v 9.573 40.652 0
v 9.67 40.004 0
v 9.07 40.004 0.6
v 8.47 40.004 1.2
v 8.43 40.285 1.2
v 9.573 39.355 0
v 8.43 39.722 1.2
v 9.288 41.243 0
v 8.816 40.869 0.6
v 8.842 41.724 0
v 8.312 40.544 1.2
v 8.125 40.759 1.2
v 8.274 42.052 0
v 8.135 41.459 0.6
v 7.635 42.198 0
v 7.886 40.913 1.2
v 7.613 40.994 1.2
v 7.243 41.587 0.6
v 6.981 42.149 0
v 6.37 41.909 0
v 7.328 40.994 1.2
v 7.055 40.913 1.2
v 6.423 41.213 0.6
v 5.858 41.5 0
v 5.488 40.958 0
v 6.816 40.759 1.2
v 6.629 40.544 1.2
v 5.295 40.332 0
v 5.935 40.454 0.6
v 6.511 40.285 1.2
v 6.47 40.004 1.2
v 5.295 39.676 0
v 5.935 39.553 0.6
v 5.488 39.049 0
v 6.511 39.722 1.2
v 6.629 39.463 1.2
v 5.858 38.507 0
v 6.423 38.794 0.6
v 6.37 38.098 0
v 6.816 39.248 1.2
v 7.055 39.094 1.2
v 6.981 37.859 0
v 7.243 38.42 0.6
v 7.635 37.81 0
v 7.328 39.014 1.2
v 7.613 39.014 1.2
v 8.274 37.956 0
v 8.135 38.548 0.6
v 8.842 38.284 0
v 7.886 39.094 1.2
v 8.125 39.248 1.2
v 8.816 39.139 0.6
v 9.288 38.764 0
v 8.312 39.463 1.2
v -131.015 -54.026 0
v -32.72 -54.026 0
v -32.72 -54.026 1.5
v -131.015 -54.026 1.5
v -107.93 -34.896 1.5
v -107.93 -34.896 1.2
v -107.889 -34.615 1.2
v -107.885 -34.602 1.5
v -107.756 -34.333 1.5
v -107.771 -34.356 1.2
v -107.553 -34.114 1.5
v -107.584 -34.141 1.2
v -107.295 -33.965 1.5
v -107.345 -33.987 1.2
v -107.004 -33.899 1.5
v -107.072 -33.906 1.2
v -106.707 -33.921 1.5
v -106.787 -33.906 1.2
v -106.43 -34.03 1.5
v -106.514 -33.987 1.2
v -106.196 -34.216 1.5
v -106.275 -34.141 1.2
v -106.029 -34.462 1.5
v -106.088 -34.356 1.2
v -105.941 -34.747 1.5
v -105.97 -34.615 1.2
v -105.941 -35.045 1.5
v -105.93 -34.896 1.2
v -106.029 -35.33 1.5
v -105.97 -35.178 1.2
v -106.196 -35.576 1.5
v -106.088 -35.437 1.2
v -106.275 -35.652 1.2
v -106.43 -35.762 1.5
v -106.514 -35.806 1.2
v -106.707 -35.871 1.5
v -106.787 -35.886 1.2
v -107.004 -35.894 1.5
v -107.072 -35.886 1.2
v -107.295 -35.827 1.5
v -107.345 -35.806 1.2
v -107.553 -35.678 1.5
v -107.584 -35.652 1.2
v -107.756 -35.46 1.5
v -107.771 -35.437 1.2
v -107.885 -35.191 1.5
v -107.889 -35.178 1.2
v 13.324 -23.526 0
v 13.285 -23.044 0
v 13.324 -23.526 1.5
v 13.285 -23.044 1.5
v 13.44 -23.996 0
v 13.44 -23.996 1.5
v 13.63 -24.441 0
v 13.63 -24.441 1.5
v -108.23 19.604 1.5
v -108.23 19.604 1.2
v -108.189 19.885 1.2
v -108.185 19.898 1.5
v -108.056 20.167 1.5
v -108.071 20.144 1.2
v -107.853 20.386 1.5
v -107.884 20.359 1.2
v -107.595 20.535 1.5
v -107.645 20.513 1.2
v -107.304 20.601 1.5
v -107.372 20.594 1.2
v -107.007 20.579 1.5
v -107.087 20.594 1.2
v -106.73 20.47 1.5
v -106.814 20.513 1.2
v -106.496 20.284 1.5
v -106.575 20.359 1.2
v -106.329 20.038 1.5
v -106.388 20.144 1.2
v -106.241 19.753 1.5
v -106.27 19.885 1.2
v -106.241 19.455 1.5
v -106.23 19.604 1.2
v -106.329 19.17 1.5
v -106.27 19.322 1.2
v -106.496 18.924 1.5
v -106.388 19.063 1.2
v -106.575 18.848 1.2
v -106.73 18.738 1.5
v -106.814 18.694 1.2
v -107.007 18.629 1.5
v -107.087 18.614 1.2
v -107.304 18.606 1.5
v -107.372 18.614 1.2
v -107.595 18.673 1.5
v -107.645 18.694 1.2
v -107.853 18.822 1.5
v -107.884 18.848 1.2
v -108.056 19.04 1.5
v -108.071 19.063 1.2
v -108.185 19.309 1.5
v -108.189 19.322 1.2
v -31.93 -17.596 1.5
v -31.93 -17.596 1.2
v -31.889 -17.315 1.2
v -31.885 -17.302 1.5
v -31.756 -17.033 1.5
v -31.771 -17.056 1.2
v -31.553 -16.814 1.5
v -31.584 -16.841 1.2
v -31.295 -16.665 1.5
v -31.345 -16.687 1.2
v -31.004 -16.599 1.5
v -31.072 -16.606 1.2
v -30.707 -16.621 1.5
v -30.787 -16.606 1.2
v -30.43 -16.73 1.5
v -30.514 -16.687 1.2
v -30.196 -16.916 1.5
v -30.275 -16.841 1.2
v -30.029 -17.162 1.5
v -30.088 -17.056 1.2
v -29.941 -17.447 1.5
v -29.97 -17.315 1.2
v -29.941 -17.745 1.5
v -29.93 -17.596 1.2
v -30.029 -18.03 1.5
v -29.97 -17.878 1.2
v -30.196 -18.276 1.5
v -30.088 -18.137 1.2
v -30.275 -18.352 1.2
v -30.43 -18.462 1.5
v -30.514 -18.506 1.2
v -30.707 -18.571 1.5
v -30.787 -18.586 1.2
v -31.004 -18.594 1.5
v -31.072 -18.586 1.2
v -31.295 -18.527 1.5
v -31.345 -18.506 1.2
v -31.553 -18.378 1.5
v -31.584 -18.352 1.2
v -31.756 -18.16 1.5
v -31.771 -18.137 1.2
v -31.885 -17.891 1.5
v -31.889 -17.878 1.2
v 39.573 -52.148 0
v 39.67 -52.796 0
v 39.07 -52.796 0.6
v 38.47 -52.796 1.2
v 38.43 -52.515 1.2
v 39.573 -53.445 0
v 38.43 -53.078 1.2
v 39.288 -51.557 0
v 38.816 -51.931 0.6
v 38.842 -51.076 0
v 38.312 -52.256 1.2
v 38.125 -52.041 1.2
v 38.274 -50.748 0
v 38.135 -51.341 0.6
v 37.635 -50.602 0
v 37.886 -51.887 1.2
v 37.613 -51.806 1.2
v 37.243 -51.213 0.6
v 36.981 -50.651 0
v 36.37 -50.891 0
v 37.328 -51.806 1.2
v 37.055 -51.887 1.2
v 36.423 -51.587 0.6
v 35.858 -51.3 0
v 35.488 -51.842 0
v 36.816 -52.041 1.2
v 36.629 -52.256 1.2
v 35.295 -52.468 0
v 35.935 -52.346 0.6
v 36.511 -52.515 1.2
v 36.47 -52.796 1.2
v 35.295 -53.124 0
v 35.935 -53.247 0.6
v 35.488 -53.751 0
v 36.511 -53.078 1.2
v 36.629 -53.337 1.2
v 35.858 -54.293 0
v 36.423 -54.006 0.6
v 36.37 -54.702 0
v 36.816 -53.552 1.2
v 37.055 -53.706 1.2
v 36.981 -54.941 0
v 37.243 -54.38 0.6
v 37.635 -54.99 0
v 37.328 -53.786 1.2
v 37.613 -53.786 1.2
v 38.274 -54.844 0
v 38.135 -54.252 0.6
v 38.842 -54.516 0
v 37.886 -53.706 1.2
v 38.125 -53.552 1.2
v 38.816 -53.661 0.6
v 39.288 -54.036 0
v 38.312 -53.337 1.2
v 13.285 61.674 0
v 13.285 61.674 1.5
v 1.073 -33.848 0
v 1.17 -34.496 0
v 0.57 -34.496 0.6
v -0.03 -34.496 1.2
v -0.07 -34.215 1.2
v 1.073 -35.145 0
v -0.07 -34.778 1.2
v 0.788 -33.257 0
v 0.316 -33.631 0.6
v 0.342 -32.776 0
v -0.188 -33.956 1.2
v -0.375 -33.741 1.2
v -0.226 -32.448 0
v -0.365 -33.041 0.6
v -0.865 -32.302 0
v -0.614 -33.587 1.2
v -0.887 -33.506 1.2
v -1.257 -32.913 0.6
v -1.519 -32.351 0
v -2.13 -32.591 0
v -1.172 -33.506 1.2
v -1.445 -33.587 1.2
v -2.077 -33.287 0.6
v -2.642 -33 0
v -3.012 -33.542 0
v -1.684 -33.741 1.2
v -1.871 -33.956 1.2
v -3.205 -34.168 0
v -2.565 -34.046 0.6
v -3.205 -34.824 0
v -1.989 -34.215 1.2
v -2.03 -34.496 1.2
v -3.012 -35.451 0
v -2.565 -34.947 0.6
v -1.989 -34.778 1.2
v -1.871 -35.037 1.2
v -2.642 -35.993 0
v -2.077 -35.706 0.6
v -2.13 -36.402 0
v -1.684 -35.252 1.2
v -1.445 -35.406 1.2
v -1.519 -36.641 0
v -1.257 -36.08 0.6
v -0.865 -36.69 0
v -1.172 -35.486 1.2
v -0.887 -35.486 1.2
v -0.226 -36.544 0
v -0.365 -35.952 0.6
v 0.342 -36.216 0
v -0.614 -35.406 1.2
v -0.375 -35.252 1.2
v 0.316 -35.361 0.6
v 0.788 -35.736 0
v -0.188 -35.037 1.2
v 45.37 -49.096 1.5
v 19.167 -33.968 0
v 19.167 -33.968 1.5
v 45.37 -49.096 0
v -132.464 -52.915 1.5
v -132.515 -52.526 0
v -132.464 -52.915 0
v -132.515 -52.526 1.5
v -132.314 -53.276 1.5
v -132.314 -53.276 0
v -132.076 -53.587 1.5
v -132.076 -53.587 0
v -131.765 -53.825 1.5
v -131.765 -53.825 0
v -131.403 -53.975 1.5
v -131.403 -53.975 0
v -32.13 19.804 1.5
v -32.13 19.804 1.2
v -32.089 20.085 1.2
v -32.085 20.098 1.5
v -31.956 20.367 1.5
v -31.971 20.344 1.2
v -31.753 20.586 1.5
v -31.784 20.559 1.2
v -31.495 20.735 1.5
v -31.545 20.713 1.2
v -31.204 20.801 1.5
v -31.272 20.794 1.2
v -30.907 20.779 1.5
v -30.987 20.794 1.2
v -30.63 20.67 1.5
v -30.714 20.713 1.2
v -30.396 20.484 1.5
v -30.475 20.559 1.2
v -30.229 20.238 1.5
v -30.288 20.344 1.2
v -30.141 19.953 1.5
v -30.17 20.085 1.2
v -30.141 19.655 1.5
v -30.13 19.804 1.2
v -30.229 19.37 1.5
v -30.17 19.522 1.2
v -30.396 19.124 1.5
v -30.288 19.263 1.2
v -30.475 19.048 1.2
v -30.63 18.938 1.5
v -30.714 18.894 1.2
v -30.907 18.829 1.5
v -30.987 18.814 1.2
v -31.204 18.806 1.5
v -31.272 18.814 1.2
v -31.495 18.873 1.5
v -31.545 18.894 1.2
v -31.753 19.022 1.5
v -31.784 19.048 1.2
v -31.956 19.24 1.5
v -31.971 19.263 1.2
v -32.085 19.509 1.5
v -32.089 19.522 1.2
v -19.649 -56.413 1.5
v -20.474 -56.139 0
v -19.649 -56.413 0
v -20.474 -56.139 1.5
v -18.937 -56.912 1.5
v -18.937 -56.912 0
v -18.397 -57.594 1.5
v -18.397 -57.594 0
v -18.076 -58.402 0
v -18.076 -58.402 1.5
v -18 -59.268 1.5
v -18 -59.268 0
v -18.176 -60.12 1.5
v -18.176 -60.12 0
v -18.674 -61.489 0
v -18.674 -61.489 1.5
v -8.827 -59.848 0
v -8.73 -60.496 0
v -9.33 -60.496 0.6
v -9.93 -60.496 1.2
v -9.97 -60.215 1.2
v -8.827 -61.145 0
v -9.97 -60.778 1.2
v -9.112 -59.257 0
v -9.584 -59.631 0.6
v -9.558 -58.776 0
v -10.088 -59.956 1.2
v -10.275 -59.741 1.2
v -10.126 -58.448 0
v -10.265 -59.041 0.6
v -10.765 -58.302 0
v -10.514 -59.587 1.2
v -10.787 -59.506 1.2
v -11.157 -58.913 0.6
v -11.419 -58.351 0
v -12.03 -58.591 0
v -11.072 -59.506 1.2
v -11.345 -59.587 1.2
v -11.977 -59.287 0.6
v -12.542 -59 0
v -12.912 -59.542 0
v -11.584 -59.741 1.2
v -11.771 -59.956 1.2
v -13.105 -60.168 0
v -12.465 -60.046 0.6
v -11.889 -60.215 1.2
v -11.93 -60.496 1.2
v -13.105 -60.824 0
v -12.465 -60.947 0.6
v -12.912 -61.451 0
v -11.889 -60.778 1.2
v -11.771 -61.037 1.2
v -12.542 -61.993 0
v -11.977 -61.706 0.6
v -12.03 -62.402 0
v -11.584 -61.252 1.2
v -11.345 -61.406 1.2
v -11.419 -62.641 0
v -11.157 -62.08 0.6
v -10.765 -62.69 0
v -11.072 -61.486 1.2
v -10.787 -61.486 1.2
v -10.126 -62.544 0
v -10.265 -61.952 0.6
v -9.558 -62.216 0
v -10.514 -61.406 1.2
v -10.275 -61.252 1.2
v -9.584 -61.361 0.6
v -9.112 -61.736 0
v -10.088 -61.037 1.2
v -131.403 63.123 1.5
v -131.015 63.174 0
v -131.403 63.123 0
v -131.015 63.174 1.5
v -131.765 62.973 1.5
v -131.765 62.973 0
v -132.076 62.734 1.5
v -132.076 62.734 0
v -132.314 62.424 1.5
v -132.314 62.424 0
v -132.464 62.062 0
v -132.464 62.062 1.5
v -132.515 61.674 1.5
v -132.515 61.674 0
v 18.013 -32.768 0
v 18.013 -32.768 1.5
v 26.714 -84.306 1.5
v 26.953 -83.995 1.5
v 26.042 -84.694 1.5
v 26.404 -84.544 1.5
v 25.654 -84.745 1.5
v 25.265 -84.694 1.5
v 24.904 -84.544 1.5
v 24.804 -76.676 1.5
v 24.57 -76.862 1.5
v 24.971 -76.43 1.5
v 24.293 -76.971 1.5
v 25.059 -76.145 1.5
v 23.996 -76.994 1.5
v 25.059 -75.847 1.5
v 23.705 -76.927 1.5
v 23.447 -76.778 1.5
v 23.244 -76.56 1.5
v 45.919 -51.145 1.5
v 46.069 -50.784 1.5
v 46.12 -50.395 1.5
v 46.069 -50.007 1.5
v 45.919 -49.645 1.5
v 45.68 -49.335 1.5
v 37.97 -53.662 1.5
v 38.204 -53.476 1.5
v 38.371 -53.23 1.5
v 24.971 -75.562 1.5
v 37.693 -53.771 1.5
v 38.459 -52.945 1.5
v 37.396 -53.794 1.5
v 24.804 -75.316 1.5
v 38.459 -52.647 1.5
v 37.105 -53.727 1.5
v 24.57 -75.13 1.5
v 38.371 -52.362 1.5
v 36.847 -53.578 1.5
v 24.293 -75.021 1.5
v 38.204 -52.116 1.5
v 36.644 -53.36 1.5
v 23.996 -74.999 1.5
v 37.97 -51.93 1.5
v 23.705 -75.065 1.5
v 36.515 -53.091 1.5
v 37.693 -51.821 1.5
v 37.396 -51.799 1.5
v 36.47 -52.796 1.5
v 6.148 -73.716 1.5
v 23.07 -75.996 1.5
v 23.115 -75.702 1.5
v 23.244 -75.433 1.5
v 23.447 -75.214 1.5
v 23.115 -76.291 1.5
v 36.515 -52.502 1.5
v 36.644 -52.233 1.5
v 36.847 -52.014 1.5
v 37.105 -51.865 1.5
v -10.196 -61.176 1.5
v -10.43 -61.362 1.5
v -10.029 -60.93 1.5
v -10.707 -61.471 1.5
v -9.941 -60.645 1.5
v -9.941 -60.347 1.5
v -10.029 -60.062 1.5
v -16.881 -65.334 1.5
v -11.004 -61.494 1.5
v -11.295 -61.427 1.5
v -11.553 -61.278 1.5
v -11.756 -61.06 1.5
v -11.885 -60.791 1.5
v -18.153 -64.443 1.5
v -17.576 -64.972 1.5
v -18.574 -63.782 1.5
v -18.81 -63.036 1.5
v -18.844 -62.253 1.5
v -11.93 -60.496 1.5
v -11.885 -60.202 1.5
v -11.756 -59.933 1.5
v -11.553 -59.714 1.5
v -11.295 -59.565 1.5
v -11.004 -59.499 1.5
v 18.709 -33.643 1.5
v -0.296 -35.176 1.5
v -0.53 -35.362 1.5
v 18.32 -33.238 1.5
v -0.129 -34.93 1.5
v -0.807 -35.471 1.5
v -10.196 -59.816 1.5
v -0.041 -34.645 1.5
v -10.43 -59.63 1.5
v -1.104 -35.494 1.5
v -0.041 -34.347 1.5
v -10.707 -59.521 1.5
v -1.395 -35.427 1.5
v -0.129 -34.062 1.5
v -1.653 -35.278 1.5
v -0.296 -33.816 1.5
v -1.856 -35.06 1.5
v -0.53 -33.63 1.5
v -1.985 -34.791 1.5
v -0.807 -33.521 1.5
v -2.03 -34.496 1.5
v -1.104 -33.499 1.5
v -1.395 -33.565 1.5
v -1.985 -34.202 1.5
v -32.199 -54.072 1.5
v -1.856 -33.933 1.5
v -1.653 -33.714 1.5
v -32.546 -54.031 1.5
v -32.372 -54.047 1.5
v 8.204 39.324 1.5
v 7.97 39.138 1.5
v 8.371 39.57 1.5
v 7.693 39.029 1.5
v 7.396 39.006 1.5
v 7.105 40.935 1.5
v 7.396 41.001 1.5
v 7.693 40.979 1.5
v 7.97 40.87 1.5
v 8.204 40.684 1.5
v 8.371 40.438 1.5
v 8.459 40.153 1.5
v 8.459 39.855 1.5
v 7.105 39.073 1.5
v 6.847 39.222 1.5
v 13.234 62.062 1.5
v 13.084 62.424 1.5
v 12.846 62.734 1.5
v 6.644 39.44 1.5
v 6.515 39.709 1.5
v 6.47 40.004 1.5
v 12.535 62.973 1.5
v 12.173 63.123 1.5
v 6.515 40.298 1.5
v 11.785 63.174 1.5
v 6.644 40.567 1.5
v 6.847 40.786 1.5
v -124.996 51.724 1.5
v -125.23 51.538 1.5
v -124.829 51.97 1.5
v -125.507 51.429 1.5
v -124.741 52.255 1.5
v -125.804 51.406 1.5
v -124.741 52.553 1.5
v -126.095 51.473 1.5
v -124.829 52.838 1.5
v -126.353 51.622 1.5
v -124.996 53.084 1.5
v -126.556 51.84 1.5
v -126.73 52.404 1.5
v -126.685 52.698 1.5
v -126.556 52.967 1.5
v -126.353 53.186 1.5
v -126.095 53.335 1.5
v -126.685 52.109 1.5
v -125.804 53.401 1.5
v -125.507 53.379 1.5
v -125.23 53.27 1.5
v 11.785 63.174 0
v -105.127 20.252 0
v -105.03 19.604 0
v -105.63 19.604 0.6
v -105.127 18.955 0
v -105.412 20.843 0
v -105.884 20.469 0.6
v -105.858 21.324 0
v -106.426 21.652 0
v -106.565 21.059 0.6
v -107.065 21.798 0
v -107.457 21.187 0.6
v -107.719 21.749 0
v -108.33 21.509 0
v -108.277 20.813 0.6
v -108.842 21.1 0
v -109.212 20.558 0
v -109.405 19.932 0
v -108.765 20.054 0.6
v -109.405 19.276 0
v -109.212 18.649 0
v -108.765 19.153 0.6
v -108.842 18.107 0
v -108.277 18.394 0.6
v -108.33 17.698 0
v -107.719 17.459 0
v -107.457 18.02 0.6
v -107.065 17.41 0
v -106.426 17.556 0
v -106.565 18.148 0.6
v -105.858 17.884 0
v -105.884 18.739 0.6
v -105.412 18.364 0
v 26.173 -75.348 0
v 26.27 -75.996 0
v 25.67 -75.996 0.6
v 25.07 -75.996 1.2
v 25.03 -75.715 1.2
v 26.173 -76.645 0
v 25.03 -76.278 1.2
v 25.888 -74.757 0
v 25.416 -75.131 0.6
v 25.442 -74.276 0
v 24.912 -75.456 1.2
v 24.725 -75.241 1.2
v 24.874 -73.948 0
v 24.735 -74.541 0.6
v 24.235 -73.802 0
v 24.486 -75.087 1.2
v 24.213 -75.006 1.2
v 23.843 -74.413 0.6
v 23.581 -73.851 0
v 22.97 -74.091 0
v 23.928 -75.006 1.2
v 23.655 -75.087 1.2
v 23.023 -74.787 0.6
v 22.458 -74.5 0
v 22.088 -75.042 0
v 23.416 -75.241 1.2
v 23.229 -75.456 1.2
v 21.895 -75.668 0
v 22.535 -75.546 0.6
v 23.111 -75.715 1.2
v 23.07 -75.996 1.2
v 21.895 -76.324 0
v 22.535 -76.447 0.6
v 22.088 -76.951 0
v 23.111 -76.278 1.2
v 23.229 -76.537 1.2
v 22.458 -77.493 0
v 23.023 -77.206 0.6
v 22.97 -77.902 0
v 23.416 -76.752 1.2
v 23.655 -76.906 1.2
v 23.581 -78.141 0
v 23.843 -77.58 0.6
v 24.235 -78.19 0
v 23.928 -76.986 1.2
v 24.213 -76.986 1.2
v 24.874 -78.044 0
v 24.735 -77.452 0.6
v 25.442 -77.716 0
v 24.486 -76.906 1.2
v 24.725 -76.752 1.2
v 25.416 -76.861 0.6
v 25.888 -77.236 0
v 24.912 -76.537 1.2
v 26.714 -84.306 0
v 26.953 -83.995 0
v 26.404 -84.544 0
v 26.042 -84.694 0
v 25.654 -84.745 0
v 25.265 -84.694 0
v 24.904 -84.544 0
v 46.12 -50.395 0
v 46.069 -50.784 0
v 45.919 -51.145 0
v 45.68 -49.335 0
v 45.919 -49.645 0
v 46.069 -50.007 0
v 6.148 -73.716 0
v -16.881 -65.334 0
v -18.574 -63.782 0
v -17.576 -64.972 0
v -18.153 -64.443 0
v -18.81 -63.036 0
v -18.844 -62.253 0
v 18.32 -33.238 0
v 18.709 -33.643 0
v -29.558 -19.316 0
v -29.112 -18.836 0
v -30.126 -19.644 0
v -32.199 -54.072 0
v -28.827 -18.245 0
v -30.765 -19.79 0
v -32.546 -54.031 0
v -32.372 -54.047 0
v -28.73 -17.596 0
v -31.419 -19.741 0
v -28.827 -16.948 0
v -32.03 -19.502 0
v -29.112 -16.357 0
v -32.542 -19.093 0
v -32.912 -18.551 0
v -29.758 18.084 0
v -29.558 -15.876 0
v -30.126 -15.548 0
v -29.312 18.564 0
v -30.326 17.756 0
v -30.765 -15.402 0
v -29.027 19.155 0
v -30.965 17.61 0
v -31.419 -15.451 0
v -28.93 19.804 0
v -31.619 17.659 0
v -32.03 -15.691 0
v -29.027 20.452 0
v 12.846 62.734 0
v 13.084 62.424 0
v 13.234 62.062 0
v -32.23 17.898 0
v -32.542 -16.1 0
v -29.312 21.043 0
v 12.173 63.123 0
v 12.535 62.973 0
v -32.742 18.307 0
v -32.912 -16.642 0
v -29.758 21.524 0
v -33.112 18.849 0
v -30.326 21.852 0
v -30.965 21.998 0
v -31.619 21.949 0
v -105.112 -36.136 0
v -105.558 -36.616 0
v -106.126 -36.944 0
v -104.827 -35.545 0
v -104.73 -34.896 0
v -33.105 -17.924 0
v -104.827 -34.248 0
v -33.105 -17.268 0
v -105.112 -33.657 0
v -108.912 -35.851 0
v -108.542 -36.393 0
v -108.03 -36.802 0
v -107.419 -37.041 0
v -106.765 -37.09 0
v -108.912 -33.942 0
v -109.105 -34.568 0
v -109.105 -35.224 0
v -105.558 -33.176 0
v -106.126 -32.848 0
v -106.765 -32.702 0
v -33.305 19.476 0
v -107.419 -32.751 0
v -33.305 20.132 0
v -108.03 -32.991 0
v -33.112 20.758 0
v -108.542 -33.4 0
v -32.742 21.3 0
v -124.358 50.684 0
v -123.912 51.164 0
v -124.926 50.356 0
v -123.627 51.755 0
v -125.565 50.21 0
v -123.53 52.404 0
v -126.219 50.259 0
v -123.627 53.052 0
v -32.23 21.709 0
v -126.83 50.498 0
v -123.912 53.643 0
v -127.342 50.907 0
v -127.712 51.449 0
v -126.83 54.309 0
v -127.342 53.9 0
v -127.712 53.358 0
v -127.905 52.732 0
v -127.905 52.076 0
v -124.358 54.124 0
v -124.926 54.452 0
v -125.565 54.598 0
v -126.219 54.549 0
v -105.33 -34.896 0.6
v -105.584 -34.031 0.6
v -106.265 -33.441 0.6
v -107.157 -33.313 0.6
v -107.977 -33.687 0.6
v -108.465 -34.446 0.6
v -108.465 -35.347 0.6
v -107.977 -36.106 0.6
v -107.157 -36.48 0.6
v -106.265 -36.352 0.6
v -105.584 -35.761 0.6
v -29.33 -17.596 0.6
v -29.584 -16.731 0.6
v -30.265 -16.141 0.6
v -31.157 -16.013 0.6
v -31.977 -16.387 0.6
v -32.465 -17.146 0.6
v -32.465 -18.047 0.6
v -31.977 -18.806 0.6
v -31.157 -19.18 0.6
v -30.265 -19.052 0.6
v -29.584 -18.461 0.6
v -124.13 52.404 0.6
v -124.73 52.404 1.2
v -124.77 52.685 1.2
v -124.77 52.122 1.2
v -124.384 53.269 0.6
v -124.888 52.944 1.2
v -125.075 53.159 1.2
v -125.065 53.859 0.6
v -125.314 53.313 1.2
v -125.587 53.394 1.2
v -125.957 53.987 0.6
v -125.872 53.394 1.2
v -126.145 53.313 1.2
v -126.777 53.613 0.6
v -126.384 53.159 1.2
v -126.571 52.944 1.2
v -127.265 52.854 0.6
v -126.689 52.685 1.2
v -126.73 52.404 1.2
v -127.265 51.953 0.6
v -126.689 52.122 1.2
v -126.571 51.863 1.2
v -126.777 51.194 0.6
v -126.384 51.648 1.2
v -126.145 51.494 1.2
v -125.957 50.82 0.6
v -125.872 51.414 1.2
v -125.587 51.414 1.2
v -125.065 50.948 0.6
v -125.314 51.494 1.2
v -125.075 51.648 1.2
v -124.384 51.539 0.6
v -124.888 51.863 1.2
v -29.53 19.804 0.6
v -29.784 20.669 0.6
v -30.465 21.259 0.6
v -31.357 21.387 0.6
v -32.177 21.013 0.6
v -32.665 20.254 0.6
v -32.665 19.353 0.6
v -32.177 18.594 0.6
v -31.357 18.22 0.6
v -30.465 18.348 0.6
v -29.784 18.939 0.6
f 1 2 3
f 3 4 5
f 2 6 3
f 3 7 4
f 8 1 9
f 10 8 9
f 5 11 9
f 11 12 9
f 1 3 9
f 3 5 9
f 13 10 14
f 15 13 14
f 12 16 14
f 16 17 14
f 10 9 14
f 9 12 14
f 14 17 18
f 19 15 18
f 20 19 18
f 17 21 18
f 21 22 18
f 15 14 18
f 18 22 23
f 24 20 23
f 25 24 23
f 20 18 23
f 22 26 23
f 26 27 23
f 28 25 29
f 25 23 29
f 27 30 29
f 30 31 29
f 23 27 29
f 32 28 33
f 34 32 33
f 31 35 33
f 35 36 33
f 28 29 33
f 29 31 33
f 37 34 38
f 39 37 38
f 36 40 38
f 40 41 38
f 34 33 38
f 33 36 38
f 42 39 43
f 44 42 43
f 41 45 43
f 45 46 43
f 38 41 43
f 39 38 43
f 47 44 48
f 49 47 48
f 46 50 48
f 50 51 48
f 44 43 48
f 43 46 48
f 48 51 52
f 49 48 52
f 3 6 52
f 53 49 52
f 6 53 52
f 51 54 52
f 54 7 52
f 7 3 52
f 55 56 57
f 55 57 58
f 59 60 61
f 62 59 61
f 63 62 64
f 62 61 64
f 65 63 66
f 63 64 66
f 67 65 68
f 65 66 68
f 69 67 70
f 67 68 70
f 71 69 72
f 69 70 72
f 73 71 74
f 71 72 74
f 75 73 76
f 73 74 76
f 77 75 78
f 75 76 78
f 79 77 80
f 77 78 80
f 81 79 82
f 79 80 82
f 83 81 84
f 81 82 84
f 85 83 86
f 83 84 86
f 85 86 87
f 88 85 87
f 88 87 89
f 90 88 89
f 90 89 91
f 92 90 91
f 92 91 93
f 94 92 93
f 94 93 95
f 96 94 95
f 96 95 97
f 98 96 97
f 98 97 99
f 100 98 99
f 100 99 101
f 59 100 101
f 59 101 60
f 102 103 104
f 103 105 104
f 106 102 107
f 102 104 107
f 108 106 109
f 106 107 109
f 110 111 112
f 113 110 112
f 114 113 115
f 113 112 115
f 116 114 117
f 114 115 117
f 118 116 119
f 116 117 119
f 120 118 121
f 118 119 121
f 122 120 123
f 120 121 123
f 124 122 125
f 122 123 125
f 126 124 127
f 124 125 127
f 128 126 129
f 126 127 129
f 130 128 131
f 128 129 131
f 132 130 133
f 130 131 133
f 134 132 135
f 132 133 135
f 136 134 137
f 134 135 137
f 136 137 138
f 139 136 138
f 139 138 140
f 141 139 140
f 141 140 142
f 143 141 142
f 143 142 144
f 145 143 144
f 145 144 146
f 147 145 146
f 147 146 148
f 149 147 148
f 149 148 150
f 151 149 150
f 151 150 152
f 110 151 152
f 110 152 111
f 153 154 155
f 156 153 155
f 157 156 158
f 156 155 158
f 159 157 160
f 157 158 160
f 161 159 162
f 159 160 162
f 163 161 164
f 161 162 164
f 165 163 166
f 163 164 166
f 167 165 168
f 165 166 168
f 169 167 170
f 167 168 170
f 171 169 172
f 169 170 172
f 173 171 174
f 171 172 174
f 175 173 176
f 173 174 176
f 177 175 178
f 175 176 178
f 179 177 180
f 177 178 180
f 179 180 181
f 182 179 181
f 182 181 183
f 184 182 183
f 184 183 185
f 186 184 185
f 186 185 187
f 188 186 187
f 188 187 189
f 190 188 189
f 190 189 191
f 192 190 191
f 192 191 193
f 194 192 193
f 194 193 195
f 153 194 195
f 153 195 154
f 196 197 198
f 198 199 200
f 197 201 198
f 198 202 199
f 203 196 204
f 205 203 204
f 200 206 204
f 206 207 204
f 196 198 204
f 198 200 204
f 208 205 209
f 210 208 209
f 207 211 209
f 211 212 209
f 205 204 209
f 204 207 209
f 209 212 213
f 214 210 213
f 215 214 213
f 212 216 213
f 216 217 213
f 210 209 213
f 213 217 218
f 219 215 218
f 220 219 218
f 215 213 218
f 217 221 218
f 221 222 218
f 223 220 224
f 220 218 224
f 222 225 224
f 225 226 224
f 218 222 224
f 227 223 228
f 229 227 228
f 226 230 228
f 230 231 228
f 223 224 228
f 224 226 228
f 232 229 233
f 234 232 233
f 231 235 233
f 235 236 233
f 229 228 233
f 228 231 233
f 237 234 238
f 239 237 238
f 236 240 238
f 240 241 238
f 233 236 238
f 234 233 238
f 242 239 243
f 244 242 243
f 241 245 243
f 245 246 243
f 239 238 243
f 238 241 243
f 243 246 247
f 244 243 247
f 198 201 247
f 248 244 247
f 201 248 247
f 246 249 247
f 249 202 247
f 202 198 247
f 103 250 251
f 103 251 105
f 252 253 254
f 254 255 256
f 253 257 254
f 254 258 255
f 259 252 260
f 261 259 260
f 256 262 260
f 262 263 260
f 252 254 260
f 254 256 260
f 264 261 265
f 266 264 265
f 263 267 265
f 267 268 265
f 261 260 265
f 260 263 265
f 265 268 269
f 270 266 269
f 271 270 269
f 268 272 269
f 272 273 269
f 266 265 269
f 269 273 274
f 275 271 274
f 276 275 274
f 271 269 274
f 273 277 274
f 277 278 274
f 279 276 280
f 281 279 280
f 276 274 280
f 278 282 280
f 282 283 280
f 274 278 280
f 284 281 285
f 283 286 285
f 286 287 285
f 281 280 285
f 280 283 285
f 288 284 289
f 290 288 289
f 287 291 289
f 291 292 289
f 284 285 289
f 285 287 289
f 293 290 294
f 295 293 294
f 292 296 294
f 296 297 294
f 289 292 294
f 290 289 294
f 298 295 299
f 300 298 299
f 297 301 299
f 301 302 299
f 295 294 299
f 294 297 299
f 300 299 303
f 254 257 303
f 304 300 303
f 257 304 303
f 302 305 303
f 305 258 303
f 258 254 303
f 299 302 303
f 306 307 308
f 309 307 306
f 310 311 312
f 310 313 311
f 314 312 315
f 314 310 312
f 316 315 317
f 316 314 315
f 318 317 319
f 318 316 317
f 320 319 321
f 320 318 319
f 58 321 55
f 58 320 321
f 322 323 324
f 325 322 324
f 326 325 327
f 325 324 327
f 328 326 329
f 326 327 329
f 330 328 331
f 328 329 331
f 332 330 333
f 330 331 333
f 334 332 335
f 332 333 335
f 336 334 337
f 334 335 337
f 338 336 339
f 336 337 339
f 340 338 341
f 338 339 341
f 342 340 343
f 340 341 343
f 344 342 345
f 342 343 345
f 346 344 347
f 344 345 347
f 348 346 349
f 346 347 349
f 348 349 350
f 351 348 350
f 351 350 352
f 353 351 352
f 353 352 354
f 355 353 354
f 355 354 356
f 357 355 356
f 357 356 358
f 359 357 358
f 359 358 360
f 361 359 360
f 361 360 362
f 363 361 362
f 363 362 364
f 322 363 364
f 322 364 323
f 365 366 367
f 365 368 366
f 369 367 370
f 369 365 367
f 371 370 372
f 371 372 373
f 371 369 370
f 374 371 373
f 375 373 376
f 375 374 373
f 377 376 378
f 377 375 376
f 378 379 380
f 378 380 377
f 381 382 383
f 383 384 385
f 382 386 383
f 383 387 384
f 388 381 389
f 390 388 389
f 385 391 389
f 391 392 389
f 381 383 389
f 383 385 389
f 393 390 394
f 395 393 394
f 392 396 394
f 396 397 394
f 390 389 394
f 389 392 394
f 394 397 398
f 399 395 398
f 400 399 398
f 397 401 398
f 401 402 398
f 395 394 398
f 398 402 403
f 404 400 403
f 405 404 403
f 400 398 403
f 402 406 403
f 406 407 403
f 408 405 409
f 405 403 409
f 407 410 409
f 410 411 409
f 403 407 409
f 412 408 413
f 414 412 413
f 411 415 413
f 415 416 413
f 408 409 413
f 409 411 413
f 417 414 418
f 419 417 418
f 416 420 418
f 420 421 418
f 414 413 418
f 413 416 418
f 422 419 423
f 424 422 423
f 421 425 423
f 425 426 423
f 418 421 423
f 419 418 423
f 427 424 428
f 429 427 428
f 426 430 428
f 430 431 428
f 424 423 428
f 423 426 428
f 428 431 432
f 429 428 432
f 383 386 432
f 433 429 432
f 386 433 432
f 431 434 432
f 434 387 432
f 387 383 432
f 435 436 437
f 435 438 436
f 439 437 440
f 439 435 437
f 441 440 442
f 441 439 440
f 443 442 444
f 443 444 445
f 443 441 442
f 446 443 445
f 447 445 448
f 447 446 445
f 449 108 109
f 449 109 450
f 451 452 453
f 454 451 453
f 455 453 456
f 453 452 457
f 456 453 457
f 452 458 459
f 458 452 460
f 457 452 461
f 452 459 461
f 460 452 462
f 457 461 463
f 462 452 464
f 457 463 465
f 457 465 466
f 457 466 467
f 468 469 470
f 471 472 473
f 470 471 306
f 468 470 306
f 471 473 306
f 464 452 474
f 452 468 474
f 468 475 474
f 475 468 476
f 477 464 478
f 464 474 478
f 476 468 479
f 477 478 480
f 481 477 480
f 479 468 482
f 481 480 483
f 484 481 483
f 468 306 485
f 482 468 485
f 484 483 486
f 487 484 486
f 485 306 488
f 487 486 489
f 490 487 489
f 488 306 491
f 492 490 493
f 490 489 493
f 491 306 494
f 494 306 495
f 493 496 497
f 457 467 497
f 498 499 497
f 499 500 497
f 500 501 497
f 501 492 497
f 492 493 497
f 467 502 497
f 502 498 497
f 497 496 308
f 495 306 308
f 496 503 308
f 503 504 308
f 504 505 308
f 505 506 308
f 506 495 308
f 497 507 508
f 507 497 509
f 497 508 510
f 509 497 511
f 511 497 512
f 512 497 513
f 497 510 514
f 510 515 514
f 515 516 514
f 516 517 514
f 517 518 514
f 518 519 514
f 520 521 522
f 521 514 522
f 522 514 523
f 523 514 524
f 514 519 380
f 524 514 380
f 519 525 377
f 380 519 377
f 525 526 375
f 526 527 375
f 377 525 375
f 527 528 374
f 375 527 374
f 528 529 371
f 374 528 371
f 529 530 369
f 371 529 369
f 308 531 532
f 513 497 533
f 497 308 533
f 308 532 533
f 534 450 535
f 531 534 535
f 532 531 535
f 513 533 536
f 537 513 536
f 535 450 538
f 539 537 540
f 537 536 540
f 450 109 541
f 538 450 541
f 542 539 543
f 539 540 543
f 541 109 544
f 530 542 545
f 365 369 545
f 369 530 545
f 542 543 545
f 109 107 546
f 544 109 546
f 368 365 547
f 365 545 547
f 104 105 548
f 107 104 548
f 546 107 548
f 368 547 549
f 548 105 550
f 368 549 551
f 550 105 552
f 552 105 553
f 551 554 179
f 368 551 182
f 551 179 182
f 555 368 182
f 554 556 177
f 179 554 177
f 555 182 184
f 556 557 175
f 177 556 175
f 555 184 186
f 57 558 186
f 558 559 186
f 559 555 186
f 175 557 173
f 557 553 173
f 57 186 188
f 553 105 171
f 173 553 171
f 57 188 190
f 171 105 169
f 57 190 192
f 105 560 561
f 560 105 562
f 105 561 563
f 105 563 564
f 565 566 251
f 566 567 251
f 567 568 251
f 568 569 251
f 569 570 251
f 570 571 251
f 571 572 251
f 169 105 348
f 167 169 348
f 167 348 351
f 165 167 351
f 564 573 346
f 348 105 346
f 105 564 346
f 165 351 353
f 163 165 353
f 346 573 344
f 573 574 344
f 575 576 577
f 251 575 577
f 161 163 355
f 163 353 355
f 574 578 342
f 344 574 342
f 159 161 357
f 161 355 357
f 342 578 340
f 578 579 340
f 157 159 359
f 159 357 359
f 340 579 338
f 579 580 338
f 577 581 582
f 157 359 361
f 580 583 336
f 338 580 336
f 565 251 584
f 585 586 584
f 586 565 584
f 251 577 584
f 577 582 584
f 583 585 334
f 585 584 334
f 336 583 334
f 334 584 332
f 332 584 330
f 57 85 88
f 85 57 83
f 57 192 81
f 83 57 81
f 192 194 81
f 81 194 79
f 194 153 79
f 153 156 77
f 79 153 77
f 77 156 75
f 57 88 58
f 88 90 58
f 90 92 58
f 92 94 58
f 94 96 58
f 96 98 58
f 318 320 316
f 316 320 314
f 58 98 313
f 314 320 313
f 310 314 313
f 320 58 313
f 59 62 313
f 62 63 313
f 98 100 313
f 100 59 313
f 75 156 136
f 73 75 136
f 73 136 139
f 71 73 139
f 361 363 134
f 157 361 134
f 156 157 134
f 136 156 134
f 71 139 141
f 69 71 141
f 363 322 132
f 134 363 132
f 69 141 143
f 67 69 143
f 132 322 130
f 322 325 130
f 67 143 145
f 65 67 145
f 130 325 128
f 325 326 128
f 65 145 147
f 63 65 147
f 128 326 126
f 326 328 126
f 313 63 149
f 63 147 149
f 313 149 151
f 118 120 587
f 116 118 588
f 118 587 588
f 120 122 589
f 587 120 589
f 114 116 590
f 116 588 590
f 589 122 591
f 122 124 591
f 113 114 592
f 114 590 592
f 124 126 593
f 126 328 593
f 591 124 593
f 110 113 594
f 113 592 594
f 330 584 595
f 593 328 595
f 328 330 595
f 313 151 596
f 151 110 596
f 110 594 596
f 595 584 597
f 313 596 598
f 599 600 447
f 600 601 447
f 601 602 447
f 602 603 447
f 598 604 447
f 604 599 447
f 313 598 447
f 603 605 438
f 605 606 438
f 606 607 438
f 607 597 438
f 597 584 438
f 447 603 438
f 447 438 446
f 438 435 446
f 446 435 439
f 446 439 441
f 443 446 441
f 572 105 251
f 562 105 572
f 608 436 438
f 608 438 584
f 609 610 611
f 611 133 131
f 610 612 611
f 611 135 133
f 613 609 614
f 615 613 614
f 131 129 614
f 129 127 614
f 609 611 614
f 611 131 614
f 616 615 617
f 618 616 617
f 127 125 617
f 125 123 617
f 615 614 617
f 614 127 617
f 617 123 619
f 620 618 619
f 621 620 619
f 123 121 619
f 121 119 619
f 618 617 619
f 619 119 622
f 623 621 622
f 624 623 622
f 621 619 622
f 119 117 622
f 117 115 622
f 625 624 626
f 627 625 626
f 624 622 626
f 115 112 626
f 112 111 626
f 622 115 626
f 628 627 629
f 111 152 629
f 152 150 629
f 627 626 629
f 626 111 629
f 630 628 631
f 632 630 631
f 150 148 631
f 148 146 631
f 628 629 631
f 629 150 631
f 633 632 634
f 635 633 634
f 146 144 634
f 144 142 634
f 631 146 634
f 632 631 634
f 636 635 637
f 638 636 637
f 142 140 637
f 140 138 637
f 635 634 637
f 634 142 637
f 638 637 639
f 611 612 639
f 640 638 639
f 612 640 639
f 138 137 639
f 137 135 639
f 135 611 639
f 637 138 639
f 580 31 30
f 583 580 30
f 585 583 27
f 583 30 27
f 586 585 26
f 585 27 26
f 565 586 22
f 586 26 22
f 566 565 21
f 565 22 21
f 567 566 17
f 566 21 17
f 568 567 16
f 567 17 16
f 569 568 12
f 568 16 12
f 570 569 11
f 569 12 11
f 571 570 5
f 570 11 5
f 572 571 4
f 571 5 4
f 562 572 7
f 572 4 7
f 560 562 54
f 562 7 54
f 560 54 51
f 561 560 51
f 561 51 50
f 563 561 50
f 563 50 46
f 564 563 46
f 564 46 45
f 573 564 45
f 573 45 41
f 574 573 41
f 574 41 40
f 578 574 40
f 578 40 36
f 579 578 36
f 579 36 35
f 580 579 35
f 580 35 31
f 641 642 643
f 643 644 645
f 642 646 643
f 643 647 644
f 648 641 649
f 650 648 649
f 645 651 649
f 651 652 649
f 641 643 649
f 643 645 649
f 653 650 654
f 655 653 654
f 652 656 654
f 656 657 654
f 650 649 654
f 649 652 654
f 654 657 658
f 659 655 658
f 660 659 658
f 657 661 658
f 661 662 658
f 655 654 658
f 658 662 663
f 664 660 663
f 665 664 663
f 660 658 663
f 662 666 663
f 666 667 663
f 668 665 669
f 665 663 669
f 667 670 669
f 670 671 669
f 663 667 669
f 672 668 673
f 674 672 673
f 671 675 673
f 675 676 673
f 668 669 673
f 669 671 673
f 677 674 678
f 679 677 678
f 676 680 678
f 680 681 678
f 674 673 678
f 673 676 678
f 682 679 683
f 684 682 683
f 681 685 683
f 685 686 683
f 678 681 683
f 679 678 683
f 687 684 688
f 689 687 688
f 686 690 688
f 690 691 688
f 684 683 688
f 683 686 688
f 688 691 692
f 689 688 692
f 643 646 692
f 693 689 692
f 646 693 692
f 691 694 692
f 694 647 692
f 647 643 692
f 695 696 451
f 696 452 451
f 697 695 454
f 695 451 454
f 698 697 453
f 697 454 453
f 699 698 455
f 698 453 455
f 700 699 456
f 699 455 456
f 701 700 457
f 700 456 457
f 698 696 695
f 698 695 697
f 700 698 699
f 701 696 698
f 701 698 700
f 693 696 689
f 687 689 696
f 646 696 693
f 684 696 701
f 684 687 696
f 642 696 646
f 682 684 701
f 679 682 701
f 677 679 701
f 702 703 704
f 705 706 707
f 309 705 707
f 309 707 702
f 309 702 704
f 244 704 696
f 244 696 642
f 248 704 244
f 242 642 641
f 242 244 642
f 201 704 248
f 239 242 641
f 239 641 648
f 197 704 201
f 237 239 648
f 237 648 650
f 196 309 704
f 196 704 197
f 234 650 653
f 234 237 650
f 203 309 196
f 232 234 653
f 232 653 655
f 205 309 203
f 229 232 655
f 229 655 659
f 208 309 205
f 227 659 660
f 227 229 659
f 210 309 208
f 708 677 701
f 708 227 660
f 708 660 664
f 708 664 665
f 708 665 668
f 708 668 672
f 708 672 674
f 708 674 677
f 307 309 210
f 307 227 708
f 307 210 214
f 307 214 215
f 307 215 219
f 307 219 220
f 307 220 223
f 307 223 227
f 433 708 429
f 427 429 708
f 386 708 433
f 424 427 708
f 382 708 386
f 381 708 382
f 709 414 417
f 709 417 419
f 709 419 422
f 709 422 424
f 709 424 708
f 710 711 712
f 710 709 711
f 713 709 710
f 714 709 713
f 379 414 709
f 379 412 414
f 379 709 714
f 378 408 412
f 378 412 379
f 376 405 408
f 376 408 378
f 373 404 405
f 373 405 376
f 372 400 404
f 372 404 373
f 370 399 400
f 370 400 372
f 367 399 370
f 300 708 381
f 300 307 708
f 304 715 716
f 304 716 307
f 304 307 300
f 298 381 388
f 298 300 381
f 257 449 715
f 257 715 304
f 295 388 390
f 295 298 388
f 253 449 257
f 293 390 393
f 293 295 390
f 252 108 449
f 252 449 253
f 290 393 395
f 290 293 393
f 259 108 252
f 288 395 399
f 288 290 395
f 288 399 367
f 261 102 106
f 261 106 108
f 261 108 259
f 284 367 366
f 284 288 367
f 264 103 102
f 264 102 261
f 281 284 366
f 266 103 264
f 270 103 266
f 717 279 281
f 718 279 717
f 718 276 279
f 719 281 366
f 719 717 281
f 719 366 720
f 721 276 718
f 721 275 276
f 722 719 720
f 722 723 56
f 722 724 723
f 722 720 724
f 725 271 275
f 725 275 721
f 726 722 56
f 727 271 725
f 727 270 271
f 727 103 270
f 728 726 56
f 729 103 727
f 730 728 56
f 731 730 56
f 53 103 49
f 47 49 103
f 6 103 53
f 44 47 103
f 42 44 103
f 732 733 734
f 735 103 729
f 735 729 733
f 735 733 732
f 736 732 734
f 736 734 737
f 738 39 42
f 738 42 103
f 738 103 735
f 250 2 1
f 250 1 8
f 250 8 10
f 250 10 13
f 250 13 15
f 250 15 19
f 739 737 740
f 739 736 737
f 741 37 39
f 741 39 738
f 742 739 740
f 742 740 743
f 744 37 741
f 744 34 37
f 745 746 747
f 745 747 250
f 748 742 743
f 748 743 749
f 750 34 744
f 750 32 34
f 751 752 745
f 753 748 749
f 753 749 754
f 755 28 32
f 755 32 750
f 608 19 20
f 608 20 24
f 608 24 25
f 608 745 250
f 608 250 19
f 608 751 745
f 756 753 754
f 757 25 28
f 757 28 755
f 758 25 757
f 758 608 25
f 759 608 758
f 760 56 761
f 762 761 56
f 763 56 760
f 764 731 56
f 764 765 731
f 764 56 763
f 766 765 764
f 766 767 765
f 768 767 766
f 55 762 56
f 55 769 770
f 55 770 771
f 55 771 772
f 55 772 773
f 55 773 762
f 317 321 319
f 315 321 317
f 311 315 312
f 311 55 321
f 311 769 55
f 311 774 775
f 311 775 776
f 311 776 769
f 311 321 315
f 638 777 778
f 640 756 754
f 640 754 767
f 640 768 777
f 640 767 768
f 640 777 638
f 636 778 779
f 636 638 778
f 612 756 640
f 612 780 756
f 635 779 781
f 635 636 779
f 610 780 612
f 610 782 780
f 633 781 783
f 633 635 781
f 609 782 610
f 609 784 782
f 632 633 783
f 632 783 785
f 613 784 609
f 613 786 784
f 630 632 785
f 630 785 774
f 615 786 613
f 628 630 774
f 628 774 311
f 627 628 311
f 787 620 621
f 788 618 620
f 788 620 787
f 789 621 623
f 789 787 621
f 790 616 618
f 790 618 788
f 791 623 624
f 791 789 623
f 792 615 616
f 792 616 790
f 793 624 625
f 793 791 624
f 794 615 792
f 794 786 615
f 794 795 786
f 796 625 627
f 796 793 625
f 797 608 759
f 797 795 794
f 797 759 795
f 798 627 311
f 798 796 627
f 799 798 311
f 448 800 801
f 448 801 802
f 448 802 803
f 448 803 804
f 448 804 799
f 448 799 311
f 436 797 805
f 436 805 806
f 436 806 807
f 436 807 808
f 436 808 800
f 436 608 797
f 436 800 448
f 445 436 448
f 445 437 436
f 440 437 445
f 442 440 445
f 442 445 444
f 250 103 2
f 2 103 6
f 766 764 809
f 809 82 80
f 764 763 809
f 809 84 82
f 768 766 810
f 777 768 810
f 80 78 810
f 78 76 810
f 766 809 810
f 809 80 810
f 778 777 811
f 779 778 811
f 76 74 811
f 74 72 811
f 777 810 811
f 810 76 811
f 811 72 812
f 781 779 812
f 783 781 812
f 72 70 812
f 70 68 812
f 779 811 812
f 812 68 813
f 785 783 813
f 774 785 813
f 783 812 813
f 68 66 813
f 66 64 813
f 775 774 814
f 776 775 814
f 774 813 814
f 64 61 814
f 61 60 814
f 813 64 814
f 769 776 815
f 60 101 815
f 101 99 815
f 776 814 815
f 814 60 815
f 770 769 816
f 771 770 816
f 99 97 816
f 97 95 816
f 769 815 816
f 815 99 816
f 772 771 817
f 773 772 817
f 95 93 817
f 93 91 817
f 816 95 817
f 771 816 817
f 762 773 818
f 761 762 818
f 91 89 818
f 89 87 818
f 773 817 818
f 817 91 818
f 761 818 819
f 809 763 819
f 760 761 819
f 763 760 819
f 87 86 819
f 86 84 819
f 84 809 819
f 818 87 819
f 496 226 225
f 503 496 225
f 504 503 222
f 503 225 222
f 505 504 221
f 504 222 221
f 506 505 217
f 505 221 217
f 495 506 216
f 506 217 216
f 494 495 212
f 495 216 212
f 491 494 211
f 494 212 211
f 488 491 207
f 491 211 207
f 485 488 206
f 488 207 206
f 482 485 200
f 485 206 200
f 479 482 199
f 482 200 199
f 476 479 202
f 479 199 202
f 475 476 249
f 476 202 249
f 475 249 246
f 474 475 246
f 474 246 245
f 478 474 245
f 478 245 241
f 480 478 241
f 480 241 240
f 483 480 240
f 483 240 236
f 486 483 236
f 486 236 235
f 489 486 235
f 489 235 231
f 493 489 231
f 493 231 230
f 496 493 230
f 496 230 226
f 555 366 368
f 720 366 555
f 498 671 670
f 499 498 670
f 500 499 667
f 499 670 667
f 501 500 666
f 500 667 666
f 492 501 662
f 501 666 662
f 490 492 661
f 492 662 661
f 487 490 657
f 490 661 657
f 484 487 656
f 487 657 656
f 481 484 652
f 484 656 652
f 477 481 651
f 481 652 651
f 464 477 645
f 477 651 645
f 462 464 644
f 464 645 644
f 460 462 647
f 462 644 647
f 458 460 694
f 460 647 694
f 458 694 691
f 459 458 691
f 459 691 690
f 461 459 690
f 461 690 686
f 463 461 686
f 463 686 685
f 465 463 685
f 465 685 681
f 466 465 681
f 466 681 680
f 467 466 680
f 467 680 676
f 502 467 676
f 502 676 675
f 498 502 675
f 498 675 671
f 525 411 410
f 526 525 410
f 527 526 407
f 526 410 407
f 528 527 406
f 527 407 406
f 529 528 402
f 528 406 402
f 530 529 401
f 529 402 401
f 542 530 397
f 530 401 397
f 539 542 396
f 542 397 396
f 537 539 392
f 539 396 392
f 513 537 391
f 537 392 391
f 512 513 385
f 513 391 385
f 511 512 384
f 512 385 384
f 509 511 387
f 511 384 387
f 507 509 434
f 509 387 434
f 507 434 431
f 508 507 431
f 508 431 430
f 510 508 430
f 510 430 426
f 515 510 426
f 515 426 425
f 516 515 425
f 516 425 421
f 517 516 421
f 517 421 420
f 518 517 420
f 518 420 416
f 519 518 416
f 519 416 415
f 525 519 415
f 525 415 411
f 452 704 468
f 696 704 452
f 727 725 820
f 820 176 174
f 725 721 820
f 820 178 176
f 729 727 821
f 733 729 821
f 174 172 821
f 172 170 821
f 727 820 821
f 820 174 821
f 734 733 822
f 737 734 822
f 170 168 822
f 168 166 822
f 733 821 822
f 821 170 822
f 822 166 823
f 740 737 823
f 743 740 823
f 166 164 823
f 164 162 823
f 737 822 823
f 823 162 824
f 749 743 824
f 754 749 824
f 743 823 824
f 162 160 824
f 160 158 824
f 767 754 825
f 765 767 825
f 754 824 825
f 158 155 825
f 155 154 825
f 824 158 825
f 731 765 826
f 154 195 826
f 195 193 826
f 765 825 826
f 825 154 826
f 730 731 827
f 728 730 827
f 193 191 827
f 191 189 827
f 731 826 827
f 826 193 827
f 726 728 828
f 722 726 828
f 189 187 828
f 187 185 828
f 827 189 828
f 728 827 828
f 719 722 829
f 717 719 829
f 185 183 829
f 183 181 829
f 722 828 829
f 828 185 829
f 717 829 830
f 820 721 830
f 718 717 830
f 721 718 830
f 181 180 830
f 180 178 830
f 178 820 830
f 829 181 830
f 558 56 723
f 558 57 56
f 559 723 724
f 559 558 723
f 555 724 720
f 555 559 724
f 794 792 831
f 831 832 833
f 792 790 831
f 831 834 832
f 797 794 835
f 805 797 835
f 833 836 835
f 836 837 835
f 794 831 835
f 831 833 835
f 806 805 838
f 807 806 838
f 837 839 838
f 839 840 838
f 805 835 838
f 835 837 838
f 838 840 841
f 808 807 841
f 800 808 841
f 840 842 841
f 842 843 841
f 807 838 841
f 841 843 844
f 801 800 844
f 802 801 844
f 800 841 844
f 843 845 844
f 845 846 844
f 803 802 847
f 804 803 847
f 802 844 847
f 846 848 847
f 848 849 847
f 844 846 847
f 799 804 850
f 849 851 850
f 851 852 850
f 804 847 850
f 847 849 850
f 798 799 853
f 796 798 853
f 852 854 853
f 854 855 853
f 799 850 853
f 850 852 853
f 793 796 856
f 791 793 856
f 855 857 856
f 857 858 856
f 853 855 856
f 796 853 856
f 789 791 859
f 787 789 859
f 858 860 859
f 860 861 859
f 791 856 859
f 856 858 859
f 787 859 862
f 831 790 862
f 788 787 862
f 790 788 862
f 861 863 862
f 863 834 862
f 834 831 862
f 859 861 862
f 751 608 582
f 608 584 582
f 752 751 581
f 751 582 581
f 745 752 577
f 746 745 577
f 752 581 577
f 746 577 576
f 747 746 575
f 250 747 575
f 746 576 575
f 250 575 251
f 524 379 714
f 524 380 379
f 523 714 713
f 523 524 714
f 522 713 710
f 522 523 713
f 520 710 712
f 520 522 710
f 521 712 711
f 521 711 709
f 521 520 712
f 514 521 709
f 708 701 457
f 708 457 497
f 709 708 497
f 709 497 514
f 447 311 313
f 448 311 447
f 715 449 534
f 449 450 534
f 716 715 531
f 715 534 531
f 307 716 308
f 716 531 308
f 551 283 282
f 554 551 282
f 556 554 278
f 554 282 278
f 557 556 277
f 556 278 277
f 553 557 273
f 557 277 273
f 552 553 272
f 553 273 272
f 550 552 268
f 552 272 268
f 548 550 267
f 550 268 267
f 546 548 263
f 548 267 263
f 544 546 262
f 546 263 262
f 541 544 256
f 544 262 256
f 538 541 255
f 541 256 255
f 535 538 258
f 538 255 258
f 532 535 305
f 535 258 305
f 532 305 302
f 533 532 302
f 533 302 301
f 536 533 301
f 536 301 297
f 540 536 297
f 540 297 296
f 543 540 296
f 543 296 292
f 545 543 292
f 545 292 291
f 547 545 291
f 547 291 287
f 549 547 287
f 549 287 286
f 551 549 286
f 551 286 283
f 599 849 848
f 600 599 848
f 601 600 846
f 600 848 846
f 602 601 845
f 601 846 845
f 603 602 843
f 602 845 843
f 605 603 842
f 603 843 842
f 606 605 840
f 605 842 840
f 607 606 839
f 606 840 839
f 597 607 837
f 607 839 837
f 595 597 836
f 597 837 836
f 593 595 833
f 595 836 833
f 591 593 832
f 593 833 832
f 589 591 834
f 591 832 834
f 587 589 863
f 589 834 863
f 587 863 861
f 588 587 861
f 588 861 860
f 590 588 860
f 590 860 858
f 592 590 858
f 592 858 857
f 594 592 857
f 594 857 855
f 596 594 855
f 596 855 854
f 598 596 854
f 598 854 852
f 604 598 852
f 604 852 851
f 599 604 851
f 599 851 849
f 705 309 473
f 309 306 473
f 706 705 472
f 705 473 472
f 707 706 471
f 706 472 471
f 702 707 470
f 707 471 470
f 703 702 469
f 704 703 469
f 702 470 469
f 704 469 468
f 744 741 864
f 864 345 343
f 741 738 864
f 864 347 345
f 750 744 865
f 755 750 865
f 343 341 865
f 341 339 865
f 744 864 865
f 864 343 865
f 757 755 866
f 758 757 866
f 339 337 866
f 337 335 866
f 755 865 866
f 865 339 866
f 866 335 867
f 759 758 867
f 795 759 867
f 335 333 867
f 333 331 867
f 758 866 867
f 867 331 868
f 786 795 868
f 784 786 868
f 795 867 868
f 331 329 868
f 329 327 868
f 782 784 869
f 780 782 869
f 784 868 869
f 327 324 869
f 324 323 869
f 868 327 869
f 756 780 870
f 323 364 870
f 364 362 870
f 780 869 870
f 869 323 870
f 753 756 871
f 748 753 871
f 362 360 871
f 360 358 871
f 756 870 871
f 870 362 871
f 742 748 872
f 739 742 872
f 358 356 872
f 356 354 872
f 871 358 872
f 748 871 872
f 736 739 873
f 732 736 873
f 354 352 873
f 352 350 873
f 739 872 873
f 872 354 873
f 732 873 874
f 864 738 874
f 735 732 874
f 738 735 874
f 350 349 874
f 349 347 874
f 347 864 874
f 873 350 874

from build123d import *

# Parameters (mm, degrees)
BOSS_EXTRUDE1_DEPTH = 1.5
SKETCH6_R           = 1
CUT_EXTRUDE1_DEPTH  = 10
FILLET4_R           = 1.5
FILLET5_R           = 3


# Read off the part's stored shape, not the designer's step: AdvancedHole1
with BuildPart() as part:
    # Sketch1 → Boss-Extrude1 (new body)
    with BuildSketch(Plane.XY):
        Polygon((-132.514999879, 63.173696093), (13.284995002, 63.173696093), (13.284995002, -23.784888353), (18.416457767, -33.534813854), (46.668669763, -49.846236055), (26.202746282, -85.294255348), (6.148371034, -73.7158564), (-19.700470814, -64.307647377), (-16.953396025, -56.760121426), (-32.457645619, -54.026303907), (-132.514999879, -54.026303907), align=None)
    extrude(amount=BOSS_EXTRUDE1_DEPTH)

    # Sketch6 → Cut-Extrude1 (cut)
    with BuildSketch(Plane(origin=(0, 0, 0), x_dir=(-1, 0, 0), z_dir=(0, 0, -1))):
        with Locations((125.729523879, 52.403696093)):
            Circle(SKETCH6_R)
        with Locations((106.929523879, -34.896303907)):
            Circle(SKETCH6_R)
        with Locations((30.929523879, -17.596303907)):
            Circle(SKETCH6_R)
        with Locations((31.129523879, 19.803696093)):
            Circle(SKETCH6_R)
        with Locations((-7.470476121, 40.003696093)):
            Circle(SKETCH6_R)
        with Locations((1.029523879, -34.496303907)):
            Circle(SKETCH6_R)
        with Locations((10.929523879, -60.496303907)):
            Circle(SKETCH6_R)
        with Locations((-37.470476121, -52.796303907)):
            Circle(SKETCH6_R)
        with Locations((-24.070476121, -75.996303907)):
            Circle(SKETCH6_R)
        with Locations((107.229523879, 19.603696093)):
            Circle(SKETCH6_R)
    extrude(amount=-CUT_EXTRUDE1_DEPTH, mode=Mode.SUBTRACT)

    # AdvancedHole1 outline → AdvancedHole1 (revolve, cut)
    with BuildSketch(Plane(origin=(37.470476121, -52.796303907, 0), x_dir=(1, 0, 0), z_dir=(0, -1, 0))):
        Polygon((2.2, 0), (1, 1.2), (1, 0), align=None)
    revolve(axis=Axis((37.470476121, -52.796303907, 0), (0, 0, 1)), mode=Mode.SUBTRACT)

    # AdvancedHole1 2 outline → AdvancedHole1 2 (revolve, cut)
    with BuildSketch(Plane(origin=(24.070476121, -75.996303907, 0), x_dir=(1, 0, 0), z_dir=(0, -1, 0))):
        Polygon((2.2, 0), (1, 1.2), (1, 0), align=None)
    revolve(axis=Axis((24.070476121, -75.996303907, 0), (0, 0, 1)), mode=Mode.SUBTRACT)

    # AdvancedHole1 3 outline → AdvancedHole1 3 (revolve, cut)
    with BuildSketch(Plane(origin=(-10.929523879, -60.496303907, 0), x_dir=(1, 0, 0), z_dir=(0, -1, 0))):
        Polygon((2.2, 0), (1, 1.2), (1, 0), align=None)
    revolve(axis=Axis((-10.929523879, -60.496303907, 0), (0, 0, 1)), mode=Mode.SUBTRACT)

    # AdvancedHole1 4 outline → AdvancedHole1 4 (revolve, cut)
    with BuildSketch(Plane(origin=(-1.029523879, -34.496303907, 0), x_dir=(1, 0, 0), z_dir=(0, -1, 0))):
        Polygon((2.2, 0), (1, 1.2), (1, 0), align=None)
    revolve(axis=Axis((-1.029523879, -34.496303907, 0), (0, 0, 1)), mode=Mode.SUBTRACT)

    # AdvancedHole1 5 outline → AdvancedHole1 5 (revolve, cut)
    with BuildSketch(Plane(origin=(-30.929523879, -17.596303907, 0), x_dir=(1, 0, 0), z_dir=(0, -1, 0))):
        Polygon((2.2, 0), (1, 1.2), (1, 0), align=None)
    revolve(axis=Axis((-30.929523879, -17.596303907, 0), (0, 0, 1)), mode=Mode.SUBTRACT)

    # AdvancedHole1 6 outline → AdvancedHole1 6 (revolve, cut)
    with BuildSketch(Plane(origin=(-106.929523879, -34.896303907, 0), x_dir=(1, 0, 0), z_dir=(0, -1, 0))):
        Polygon((2.2, 0), (1, 1.2), (1, 0), align=None)
    revolve(axis=Axis((-106.929523879, -34.896303907, 0), (0, 0, 1)), mode=Mode.SUBTRACT)

    # AdvancedHole1 7 outline → AdvancedHole1 7 (revolve, cut)
    with BuildSketch(Plane(origin=(-125.729523879, 52.403696093, 0), x_dir=(1, 0, 0), z_dir=(0, -1, 0))):
        Polygon((2.2, 0), (1, 1.2), (1, 0), align=None)
    revolve(axis=Axis((-125.729523879, 52.403696093, 0), (0, 0, 1)), mode=Mode.SUBTRACT)

    # AdvancedHole1 8 outline → AdvancedHole1 8 (revolve, cut)
    with BuildSketch(Plane(origin=(-31.129523879, 19.803696093, 0), x_dir=(1, 0, 0), z_dir=(0, -1, 0))):
        Polygon((2.2, 0), (1, 1.2), (1, 0), align=None)
    revolve(axis=Axis((-31.129523879, 19.803696093, 0), (0, 0, 1)), mode=Mode.SUBTRACT)

    # AdvancedHole1 9 outline → AdvancedHole1 9 (revolve, cut)
    with BuildSketch(Plane(origin=(-107.229523879, 19.603696093, 0), x_dir=(1, 0, 0), z_dir=(0, -1, 0))):
        Polygon((2.2, 0), (1, 1.2), (1, 0), align=None)
    revolve(axis=Axis((-107.229523879, 19.603696093, 0), (0, 0, 1)), mode=Mode.SUBTRACT)

    # AdvancedHole1 10 outline → AdvancedHole1 10 (revolve, cut)
    with BuildSketch(Plane(origin=(7.470476121, 40.003696093, 0), x_dir=(1, 0, 0), z_dir=(0, -1, 0))):
        Polygon((2.2, 0), (1, 1.2), (1, 0), align=None)
    revolve(axis=Axis((7.470476121, 40.003696093, 0), (0, 0, 1)), mode=Mode.SUBTRACT)

    # Fillet4
    fillet4_edges = [part.edges().sort_by_distance(p)[0] for p in [
        (-132.514999879, 63.173696093, 0.75),
        (13.284995002, 63.173696093, 0.75),
        (46.668669763, -49.846236055, 0.75),
        (26.202746282, -85.294255348, 0.75),
        (-132.514999879, -54.026303907, 0.75),
    ]]
    fillet(fillet4_edges, radius=FILLET4_R)

    # Fillet5
    fillet5_edges = [part.edges().sort_by_distance(p)[0] for p in [
        (13.284995002, -23.784888353, 0.75),
        (18.416457767, -33.534813854, 0.75),
        (-19.700470814, -64.307647377, 0.75),
        (-16.953396025, -56.760121426, 0.75),
        (-32.457645619, -54.026303907, 0.75),
    ]]
    fillet(fillet5_edges, radius=FILLET5_R)


solid = part.part
